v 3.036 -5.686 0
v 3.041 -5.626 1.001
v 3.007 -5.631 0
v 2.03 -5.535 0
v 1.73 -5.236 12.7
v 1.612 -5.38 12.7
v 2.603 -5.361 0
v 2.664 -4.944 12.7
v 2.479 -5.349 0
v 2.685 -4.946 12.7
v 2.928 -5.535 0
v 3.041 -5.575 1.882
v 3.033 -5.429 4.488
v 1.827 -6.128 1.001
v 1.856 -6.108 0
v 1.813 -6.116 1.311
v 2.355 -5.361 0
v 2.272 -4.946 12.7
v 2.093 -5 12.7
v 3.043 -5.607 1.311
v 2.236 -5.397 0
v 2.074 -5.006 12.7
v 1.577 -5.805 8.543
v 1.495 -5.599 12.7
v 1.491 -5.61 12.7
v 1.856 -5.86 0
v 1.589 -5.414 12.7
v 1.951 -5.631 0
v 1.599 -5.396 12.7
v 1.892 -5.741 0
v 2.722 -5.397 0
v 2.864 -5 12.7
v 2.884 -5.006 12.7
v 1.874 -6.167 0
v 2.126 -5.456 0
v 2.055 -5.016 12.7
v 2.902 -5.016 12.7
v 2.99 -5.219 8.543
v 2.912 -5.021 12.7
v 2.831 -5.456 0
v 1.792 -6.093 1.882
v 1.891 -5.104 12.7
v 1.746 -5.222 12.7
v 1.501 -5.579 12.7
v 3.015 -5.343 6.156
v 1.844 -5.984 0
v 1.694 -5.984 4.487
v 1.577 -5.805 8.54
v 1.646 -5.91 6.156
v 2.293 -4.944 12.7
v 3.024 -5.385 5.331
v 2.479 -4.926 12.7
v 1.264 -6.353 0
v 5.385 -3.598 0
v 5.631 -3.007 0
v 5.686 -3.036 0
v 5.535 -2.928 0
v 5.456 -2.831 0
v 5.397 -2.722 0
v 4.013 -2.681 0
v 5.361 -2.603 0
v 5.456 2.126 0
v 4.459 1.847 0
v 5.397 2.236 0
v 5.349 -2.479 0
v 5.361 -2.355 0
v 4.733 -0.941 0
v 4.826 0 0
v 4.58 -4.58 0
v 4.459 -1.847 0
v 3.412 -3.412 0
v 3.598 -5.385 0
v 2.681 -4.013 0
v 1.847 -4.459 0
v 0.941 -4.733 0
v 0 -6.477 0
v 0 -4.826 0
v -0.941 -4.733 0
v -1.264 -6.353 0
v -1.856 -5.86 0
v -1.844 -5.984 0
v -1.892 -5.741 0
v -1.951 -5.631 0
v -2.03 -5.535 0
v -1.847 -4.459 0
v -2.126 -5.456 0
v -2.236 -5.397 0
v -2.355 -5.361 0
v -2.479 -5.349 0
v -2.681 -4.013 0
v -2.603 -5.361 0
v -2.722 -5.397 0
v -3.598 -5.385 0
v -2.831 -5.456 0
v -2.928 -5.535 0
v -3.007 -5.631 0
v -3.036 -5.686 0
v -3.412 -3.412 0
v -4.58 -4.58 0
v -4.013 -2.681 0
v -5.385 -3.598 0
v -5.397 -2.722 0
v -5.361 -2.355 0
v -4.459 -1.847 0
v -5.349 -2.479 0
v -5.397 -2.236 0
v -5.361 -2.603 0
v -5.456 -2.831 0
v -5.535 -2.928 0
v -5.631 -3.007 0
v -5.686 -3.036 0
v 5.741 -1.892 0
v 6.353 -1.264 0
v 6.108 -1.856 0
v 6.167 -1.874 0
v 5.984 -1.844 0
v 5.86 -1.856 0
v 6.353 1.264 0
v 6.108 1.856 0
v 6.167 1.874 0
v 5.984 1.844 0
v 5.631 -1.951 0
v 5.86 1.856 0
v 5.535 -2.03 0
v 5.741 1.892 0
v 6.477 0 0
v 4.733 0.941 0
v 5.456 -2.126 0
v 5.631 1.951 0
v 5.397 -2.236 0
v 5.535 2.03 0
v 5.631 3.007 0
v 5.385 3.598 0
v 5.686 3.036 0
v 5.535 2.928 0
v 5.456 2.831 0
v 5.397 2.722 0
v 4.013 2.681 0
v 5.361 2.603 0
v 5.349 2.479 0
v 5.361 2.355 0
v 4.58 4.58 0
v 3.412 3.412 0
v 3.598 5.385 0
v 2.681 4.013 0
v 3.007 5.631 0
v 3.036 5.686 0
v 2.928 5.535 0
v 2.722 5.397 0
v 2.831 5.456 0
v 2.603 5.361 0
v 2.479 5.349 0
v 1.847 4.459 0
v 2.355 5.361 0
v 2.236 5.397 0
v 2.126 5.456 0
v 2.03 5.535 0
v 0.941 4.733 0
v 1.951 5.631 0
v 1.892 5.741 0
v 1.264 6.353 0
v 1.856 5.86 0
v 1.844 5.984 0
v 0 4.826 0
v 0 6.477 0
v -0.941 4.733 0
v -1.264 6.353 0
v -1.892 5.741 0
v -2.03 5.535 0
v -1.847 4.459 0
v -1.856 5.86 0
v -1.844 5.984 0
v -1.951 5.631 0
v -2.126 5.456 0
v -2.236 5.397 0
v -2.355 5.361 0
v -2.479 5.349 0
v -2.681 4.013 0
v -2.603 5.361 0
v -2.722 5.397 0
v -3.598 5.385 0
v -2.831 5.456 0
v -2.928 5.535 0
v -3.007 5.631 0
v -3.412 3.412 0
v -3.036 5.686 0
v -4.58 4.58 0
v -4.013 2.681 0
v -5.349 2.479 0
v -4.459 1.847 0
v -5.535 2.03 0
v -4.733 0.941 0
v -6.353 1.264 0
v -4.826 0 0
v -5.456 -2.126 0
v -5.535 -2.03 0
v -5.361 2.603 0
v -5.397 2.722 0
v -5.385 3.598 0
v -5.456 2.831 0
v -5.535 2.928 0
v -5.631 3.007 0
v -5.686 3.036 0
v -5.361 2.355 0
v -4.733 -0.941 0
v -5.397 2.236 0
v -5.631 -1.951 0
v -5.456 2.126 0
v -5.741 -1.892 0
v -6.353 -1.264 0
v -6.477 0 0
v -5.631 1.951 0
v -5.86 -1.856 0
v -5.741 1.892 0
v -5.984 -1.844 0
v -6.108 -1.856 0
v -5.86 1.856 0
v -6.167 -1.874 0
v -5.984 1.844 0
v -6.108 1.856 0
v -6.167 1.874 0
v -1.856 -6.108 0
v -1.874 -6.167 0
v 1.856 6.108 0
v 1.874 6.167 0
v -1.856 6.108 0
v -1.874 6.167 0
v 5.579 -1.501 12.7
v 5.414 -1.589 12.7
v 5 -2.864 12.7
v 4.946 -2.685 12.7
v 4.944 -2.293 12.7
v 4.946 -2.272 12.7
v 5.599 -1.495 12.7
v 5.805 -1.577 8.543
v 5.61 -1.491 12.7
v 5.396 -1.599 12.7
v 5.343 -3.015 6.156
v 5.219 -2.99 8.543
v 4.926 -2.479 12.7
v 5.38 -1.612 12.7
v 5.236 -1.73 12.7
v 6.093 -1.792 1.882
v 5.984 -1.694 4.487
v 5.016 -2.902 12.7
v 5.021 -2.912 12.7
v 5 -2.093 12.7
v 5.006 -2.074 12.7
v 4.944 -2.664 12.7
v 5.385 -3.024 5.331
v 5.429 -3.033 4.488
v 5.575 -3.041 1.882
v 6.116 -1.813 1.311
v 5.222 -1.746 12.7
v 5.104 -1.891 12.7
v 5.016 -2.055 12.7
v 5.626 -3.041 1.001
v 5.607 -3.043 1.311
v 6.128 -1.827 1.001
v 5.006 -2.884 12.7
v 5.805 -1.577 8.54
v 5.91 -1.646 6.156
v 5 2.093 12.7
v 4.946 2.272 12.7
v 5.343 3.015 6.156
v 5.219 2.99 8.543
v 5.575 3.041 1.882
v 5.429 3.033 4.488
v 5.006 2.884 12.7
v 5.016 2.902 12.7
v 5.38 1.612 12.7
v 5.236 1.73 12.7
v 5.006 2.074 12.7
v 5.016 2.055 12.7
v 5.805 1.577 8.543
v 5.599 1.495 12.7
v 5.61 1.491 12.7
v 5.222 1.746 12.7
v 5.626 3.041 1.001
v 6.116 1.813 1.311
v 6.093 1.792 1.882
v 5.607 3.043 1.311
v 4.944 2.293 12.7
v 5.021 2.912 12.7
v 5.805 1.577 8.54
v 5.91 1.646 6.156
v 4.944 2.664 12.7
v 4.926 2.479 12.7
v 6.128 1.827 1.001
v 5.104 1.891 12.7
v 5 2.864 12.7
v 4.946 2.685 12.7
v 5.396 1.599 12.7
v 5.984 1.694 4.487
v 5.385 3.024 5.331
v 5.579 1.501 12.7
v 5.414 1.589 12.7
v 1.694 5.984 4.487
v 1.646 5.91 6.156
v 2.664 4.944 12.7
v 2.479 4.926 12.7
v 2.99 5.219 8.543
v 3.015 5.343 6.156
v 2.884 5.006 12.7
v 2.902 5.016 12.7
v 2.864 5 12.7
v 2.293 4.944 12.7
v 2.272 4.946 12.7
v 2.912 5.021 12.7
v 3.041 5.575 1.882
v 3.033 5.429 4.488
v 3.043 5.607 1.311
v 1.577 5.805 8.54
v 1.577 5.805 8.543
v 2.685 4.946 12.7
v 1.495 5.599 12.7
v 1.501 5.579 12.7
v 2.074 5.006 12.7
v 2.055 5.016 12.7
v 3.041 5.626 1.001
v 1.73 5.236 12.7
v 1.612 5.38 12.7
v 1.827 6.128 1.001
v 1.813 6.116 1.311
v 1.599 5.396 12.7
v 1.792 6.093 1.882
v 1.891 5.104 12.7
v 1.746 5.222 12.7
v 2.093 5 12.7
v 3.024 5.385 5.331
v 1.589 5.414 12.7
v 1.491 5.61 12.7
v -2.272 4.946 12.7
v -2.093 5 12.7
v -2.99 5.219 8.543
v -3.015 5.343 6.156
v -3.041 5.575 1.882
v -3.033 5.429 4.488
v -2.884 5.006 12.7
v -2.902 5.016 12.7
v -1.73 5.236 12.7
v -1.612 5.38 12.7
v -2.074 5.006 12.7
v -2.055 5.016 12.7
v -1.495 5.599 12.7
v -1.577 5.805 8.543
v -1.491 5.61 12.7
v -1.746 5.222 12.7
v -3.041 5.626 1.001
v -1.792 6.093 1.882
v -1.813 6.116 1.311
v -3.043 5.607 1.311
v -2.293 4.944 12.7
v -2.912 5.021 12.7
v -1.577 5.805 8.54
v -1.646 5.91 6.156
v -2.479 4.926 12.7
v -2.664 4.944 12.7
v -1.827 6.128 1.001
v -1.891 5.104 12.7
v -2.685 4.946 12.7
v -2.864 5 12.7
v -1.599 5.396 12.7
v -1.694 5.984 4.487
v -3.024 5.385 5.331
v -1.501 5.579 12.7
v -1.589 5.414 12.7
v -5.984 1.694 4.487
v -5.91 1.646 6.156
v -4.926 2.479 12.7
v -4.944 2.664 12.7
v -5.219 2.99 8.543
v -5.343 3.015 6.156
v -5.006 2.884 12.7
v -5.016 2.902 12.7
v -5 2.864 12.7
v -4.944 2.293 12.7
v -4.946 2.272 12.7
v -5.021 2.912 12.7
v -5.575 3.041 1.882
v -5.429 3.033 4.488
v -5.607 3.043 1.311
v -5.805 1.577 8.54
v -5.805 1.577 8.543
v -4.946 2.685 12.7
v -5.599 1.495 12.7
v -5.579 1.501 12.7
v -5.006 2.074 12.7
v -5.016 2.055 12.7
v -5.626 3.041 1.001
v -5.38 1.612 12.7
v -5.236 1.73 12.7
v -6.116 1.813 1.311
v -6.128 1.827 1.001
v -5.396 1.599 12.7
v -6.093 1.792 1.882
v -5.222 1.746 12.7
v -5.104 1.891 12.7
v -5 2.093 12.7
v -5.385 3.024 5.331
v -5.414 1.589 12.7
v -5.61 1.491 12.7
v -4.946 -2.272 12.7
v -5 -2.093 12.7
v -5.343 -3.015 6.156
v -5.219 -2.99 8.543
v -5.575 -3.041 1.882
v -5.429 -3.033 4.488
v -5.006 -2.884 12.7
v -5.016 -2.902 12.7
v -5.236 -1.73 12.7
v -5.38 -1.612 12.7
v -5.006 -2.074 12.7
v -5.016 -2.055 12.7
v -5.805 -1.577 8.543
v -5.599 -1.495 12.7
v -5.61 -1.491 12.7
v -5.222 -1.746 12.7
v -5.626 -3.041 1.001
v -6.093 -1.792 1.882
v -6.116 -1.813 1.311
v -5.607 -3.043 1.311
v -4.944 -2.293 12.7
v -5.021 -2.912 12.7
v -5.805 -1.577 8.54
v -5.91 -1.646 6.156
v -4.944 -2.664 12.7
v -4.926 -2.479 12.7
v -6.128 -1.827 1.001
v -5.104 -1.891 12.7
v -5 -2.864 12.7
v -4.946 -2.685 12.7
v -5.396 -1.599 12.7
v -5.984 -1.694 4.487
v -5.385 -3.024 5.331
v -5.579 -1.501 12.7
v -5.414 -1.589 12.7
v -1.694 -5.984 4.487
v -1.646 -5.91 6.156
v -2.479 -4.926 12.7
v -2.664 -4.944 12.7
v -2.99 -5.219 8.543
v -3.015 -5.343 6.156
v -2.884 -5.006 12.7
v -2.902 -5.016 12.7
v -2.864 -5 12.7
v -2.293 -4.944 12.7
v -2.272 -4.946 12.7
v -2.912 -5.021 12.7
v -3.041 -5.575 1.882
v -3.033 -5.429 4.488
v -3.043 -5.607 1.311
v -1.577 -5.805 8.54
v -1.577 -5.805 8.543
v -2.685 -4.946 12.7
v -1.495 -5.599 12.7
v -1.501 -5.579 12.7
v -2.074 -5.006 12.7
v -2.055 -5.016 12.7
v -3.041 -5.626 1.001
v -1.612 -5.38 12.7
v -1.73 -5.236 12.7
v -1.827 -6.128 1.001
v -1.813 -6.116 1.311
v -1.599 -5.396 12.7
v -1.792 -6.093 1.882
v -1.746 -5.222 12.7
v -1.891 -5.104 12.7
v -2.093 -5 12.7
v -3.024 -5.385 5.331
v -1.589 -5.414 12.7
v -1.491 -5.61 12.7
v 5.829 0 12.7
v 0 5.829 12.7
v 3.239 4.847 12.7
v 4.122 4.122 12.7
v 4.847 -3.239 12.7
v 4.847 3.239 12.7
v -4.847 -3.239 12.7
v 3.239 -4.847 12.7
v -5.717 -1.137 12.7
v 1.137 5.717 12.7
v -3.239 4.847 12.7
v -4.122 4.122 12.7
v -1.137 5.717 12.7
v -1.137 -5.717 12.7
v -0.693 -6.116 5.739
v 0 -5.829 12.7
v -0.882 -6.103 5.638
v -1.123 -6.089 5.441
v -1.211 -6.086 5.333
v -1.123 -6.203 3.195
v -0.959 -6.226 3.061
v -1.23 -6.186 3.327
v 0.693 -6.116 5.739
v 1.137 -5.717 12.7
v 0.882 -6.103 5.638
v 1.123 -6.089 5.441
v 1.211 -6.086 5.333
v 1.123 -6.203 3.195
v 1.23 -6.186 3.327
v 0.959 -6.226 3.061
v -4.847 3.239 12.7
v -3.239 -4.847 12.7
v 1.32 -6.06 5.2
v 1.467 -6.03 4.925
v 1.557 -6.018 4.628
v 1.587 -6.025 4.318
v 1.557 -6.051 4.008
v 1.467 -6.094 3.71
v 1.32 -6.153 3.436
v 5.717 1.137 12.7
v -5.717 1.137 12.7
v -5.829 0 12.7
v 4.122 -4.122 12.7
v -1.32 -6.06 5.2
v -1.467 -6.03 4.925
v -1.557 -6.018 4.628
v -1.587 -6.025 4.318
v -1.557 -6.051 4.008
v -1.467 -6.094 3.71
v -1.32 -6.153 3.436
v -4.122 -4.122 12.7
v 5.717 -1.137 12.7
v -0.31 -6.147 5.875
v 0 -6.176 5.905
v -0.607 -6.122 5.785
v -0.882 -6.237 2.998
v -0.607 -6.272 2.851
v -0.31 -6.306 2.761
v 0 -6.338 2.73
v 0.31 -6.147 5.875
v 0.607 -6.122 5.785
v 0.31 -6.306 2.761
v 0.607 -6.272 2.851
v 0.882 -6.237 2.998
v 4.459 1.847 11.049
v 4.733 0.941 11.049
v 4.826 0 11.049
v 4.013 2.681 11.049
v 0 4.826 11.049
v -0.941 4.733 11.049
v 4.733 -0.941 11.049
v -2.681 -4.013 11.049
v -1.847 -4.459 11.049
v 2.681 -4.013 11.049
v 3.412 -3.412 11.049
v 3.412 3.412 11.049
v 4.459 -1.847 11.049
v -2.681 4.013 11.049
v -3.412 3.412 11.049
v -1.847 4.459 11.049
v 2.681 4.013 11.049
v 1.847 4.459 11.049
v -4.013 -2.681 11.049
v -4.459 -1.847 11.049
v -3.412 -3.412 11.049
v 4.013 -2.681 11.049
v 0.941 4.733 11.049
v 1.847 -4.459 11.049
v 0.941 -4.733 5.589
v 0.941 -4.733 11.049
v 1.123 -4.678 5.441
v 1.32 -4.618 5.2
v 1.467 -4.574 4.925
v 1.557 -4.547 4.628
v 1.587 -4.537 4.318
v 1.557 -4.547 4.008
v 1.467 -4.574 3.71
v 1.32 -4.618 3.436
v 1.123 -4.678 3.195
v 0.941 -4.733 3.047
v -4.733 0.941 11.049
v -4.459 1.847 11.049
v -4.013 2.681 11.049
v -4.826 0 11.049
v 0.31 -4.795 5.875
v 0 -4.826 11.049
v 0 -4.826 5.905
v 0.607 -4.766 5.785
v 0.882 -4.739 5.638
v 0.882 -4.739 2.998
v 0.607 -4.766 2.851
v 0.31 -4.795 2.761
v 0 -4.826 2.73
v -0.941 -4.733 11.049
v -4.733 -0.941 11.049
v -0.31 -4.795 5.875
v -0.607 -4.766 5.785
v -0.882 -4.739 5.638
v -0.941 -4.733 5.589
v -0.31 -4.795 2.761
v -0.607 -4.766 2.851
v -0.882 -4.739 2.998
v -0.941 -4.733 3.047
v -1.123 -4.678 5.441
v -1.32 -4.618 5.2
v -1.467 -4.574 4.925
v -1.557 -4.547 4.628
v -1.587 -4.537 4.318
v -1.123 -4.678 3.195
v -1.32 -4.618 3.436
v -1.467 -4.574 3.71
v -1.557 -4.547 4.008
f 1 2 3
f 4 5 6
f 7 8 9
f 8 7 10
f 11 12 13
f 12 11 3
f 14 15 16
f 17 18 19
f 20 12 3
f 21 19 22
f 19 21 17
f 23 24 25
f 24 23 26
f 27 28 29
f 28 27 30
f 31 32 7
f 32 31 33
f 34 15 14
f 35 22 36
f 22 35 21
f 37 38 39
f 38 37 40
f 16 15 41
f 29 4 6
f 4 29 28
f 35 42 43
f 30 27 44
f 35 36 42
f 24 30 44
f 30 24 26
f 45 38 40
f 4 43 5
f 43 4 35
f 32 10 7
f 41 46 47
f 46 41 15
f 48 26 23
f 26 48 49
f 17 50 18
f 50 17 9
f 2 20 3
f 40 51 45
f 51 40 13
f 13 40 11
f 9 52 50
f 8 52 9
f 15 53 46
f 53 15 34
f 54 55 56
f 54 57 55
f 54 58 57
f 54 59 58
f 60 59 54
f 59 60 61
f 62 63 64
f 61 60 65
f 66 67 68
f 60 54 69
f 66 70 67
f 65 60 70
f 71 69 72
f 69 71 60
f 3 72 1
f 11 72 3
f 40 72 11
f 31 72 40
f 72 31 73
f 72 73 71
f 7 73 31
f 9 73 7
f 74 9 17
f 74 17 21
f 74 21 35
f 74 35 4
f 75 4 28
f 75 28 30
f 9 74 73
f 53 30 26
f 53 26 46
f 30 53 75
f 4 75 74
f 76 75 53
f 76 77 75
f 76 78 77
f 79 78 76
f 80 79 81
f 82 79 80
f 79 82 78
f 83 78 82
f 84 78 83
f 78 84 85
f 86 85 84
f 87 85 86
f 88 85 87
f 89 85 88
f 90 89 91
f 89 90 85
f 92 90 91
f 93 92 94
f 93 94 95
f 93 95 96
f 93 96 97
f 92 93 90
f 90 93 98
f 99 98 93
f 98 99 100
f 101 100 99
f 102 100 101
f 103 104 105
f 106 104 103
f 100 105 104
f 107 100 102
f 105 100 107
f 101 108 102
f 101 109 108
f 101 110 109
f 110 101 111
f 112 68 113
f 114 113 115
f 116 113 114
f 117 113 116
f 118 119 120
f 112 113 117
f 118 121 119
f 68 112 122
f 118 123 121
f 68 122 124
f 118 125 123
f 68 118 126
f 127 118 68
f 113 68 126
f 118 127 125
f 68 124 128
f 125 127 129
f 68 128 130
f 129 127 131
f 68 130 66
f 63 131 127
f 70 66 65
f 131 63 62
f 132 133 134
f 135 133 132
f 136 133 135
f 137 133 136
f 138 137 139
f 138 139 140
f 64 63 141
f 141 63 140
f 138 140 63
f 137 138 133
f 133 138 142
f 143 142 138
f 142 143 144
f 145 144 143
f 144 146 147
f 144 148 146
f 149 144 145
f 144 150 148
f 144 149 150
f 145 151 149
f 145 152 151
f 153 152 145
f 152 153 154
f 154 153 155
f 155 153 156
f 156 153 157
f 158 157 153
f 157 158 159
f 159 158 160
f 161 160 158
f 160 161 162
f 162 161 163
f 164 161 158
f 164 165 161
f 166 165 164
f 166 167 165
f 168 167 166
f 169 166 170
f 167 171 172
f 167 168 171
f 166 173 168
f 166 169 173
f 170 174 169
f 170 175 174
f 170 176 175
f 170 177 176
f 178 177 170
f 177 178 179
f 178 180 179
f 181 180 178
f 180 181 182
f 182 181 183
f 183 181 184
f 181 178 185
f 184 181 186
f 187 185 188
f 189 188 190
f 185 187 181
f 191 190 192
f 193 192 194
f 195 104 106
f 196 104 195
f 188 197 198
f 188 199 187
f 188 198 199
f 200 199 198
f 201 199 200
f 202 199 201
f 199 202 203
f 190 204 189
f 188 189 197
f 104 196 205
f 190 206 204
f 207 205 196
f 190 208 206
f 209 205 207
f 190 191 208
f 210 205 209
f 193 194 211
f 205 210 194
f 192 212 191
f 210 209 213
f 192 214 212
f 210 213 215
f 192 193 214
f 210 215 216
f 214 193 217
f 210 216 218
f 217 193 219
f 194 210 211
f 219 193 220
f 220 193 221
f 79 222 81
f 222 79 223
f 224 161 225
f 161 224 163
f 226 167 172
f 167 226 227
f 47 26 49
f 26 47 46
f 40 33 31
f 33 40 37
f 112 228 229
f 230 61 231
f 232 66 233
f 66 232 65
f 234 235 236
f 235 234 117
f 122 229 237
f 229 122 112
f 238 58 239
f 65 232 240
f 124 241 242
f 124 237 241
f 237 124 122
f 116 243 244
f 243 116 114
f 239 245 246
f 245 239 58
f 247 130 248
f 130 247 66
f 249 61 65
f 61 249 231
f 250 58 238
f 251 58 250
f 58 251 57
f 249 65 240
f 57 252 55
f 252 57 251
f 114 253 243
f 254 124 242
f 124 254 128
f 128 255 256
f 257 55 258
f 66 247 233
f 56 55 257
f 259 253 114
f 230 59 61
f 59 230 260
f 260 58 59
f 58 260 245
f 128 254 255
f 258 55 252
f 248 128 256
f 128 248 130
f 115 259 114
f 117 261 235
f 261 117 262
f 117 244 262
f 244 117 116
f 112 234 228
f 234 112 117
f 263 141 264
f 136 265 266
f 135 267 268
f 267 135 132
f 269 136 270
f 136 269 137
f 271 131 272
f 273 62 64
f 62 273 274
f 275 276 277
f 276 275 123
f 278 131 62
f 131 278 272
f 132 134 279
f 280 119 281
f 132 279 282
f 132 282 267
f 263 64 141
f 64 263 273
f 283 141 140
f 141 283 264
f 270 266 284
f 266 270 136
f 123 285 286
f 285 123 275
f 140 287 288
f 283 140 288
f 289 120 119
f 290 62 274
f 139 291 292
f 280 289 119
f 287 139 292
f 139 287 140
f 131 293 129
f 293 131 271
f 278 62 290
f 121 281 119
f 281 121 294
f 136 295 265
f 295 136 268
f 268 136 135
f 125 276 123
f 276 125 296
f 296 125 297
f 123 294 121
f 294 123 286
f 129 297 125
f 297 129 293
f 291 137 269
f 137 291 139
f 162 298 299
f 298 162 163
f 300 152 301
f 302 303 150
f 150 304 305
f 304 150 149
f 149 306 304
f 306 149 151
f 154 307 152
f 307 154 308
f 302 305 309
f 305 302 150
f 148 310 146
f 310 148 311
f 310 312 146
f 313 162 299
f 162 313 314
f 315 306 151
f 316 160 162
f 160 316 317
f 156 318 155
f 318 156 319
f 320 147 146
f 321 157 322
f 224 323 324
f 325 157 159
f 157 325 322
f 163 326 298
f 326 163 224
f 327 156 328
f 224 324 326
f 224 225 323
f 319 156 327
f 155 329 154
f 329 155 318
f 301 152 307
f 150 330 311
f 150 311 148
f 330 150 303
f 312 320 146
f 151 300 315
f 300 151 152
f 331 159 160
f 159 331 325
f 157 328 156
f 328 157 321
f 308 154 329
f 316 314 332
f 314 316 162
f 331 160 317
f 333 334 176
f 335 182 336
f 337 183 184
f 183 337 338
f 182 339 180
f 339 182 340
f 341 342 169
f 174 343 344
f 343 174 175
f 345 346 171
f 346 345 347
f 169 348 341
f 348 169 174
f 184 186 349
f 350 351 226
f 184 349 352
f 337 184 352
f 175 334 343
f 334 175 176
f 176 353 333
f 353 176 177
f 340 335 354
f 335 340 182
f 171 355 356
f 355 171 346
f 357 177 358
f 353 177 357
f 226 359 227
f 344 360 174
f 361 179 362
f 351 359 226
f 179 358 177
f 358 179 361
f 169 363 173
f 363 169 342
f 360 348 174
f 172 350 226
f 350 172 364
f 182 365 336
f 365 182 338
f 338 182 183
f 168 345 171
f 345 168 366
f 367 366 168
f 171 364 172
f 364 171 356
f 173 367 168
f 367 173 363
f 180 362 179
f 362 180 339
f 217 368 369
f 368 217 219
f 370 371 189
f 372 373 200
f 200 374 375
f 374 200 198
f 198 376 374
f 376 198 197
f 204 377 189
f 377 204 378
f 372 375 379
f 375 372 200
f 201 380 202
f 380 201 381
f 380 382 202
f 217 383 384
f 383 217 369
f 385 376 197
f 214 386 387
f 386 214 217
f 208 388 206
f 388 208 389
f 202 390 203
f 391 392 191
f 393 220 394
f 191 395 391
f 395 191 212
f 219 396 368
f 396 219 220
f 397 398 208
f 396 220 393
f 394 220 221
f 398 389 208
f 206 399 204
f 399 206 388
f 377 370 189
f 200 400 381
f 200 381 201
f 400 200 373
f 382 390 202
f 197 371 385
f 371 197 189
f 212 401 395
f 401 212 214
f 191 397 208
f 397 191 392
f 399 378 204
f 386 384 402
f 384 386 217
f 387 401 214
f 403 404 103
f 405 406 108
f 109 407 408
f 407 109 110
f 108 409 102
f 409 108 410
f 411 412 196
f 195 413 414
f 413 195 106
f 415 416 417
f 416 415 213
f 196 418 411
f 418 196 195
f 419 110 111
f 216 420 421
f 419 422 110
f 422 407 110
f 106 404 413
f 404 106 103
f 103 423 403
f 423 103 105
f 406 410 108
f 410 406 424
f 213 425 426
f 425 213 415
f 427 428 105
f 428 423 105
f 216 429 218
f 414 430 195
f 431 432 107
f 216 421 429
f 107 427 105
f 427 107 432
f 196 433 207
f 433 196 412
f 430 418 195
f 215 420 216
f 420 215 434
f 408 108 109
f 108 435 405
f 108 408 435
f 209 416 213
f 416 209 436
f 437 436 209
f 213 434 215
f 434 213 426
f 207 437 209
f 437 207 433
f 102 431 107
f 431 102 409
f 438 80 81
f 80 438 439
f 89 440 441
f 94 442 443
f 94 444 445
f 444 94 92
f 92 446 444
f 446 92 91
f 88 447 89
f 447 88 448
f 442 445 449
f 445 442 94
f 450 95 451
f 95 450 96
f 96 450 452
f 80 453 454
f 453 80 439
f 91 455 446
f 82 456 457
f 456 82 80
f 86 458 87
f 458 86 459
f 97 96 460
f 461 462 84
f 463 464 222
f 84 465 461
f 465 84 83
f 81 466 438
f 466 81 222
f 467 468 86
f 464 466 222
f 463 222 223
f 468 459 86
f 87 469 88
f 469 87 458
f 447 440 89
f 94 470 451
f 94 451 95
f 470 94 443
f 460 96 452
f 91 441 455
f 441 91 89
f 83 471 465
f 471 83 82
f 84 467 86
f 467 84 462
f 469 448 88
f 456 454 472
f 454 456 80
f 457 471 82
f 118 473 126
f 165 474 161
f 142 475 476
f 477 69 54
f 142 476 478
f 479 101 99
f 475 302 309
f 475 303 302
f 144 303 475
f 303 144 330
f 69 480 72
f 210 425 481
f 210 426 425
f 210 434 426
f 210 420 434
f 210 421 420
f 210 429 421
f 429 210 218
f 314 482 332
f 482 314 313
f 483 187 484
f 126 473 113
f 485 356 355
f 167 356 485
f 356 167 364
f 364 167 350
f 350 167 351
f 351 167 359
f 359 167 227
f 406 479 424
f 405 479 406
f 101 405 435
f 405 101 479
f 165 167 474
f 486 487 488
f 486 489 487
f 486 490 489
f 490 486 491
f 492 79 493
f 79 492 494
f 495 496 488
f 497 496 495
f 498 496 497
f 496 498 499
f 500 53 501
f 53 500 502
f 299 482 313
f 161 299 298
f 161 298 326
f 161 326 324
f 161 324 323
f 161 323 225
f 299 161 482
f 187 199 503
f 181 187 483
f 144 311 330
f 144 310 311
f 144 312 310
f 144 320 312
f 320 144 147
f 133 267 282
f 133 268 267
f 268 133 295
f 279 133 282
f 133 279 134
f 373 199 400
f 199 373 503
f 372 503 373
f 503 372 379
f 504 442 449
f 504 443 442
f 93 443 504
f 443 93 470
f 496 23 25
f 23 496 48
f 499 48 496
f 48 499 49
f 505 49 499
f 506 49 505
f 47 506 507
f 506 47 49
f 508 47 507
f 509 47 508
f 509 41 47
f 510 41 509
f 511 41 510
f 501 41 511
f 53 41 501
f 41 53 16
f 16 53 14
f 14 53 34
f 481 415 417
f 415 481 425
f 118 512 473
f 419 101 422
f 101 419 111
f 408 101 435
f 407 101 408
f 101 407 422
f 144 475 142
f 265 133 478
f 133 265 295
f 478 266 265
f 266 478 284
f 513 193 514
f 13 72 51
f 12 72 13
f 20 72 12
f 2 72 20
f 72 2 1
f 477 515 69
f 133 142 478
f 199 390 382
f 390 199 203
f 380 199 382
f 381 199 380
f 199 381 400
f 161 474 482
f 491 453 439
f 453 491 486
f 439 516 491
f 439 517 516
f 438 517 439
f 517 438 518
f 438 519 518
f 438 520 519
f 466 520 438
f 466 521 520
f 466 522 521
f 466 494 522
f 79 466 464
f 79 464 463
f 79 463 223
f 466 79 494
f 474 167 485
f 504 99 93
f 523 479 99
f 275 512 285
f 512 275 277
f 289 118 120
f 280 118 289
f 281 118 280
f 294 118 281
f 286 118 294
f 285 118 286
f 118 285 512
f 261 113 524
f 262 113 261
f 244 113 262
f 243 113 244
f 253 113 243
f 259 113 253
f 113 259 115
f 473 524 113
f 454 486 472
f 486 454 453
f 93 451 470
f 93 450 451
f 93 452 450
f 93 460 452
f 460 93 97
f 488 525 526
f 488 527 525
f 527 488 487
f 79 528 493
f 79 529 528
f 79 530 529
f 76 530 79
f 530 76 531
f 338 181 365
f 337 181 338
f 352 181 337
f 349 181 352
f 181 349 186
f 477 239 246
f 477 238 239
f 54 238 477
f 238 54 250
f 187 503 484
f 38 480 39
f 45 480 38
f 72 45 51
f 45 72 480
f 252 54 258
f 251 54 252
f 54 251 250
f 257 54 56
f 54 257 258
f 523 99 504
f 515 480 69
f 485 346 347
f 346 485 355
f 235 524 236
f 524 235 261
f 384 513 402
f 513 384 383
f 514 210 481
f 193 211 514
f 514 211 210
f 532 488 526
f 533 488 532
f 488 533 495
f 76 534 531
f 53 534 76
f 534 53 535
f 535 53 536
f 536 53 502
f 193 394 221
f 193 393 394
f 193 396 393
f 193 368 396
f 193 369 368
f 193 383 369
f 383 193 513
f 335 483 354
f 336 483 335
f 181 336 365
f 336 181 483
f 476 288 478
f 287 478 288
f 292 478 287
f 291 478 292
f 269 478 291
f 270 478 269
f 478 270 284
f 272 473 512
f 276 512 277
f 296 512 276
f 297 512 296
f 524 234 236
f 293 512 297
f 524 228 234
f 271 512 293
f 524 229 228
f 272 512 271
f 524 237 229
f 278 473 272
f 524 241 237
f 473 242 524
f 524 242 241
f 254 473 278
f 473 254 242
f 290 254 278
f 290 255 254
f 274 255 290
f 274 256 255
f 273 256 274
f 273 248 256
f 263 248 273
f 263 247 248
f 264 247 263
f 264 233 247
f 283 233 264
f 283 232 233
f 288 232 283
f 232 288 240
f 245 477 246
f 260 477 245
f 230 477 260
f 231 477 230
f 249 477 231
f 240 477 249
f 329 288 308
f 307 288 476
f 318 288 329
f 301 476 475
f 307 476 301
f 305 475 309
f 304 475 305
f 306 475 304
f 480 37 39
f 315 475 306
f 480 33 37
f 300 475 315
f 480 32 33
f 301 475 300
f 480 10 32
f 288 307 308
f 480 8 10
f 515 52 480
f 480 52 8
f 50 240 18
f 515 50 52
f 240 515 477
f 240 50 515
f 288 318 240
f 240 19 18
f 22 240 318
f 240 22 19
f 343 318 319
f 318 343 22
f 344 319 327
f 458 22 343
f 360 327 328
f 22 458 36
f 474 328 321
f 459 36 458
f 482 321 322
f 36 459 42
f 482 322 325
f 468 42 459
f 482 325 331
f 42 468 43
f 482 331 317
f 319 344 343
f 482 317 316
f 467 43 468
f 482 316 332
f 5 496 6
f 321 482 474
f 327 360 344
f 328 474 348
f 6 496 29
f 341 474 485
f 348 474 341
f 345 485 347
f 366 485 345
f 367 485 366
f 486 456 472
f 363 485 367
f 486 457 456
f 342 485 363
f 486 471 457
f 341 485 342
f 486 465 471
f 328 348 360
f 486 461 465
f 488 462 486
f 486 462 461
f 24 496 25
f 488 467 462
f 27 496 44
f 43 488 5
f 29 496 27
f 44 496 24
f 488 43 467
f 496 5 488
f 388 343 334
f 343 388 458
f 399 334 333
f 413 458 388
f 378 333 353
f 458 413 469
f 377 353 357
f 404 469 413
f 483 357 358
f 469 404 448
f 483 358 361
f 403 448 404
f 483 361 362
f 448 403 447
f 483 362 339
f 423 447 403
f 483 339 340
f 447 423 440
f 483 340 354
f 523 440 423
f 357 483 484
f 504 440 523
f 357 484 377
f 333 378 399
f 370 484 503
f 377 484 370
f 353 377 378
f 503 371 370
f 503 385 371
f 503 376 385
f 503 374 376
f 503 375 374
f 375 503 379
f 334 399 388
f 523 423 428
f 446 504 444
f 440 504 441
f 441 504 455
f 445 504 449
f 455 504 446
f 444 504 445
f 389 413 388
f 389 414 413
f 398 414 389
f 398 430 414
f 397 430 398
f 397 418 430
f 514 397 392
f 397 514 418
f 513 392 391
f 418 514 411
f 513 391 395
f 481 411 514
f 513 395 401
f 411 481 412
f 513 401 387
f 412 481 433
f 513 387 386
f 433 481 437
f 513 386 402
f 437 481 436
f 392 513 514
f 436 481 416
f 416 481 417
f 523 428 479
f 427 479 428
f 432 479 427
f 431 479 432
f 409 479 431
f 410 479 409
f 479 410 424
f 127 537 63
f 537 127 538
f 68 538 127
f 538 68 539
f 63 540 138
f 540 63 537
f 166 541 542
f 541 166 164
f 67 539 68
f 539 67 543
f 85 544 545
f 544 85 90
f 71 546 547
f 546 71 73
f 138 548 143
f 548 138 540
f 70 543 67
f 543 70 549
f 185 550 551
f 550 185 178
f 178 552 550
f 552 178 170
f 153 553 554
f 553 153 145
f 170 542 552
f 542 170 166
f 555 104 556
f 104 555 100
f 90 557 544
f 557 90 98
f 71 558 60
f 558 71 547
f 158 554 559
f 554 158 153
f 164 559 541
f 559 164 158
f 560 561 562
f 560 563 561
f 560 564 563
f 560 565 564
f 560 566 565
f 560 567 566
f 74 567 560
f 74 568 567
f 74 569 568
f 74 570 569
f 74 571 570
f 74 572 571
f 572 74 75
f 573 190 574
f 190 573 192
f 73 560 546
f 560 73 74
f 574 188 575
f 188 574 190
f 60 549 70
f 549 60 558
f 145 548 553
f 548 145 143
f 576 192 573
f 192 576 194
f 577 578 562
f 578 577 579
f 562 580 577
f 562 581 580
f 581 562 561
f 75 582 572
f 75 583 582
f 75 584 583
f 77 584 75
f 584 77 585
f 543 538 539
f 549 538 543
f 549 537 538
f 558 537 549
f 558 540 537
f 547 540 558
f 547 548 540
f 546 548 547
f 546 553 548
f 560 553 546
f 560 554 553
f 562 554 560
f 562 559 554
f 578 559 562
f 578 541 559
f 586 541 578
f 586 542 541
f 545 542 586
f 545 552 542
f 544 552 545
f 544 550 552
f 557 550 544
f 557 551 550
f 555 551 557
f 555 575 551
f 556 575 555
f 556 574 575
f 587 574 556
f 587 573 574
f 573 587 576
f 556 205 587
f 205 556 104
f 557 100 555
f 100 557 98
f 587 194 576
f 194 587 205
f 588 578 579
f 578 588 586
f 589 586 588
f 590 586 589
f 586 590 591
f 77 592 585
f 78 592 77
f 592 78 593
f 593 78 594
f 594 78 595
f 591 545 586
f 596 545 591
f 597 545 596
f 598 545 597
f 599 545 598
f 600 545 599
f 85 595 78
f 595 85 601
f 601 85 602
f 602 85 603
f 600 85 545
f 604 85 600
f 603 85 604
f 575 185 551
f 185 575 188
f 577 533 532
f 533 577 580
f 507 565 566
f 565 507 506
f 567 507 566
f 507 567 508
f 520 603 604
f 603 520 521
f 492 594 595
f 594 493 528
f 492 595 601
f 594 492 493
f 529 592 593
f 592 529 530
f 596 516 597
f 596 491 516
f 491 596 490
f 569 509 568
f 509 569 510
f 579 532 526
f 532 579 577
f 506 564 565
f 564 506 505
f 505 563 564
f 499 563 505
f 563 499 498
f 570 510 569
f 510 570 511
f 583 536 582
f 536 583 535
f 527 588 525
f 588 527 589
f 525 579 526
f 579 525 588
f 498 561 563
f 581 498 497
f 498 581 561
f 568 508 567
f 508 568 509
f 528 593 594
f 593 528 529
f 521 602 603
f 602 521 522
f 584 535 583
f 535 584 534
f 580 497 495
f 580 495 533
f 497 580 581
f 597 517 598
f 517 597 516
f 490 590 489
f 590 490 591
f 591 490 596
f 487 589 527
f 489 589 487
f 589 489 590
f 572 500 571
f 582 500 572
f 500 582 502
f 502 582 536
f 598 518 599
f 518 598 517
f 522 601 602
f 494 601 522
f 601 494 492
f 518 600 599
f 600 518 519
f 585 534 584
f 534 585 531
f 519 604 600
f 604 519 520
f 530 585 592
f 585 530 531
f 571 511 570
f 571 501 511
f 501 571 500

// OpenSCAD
// Inner knob for HP6289 DC power supply
ShaftDia = 0.380;
KnobWallThickness = 0.065;
KnobOuterDia = ShaftDia + 2 * KnobWallThickness; 
KnobLength = 0.5;
SetScrewZ = 0.170;
SetScrewDia = 0.125;
IndentDia = 0.05;
$fn=32; // round things are drawn in 32 segments

module ScrewHole() {
  translate([0,-1.5*KnobWallThickness,SetScrewZ])
    rotate([90,0,0])
      cylinder(d=SetScrewDia, h=4*KnobWallThickness);
}
module Indent() {
  translate([0.5*KnobOuterDia, 0, 0])
    cylinder(d1=IndentDia, d2=1.8*IndentDia, h=KnobLength+0.1);
}
module IndentSet() {
  rotate([0,0,-90])
    for(a = [22.5:45:350]) {
      rotate([0,0,a])
        Indent();
    }
}
module HP6289_Inner() {
  difference() {
    cylinder(d1=KnobOuterDia, 
             d2=KnobOuterDia * 0.9, // taper the body
	     h = KnobLength);
    translate([0,0,-0.1]) // don't drill all the way through!
      cylinder(d=ShaftDia,
               h = KnobLength - KnobWallThickness + 0.1);
    ScrewHole();  // hole for the setscrew
    IndentSet();  // add texture to the surface
  }
}
scale([25.4,25.4,25.4]) { // scale from inches to mm
    HP6289_Inner(); 
}
